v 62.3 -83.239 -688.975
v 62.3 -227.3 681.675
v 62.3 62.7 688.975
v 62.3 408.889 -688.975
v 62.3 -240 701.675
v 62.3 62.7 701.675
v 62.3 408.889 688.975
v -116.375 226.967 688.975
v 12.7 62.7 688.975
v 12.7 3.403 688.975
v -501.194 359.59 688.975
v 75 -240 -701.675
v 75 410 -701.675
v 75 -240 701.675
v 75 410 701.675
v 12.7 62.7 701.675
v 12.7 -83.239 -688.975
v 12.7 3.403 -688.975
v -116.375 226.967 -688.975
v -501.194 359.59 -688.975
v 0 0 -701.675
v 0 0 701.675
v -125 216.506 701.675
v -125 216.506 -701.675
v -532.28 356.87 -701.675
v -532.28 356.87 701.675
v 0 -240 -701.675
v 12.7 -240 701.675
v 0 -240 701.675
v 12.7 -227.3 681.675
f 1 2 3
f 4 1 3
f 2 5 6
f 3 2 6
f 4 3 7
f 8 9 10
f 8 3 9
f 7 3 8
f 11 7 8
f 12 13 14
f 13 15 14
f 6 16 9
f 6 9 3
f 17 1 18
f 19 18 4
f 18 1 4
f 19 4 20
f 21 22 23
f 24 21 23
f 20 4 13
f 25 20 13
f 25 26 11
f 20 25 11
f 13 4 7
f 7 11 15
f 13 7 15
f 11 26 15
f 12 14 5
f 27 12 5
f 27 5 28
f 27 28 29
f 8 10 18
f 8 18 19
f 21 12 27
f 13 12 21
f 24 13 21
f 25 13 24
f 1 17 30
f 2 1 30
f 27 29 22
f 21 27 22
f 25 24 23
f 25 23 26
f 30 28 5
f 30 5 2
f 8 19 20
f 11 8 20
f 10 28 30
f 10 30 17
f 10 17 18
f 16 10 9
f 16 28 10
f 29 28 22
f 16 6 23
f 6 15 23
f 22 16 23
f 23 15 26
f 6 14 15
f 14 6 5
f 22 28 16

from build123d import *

# Parameters (mm, degrees)
BOSS_EXTRUDE1_DEPTH = 701.675
SHELL1_T            = -12.7
SKETCH3_W           = 49.6
SKETCH3_H           = 290
CUT_EXTRUDE1_DEPTH  = 20
BOSS_EXTRUDE2_REACH = 980.494
CHAMFER1_SIZE       = 12.7
CHAMFER1_SIZE_2     = 20


with BuildPart() as part:
    # Sketch2 → Boss-Extrude1 (new, symmetric)
    with BuildSketch(Plane.XY):
        Polygon((0, 0), (-125, 216.506350946), (-532.280287957, 356.869859221), (75, 410), (75, -240), (0, -240), align=None)
    extrude(amount=BOSS_EXTRUDE1_DEPTH, both=True)

    # Shell1
    shell1_openings = [part.faces().sort_by_distance(p)[0] for p in [
        (-228.640143978, 383.434929611, 0),
    ]]
    offset(amount=SHELL1_T, openings=shell1_openings, kind=Kind.INTERSECTION)

    # Sketch3 → Cut-Extrude1 (cut)
    with BuildSketch(Plane.XY.offset(701.675)):
        with Locations((37.5, -82.3)):
            Rectangle(SKETCH3_W, SKETCH3_H)
    extrude(amount=-CUT_EXTRUDE1_DEPTH, mode=Mode.SUBTRACT)

    # Sketch4 → Boss-Extrude2 (add, up to next)
    with BuildSketch(Plane(origin=(12.7, 0, 0), x_dir=(0, 0, -1), z_dir=(1, 0, 0)), mode=Mode.PRIVATE) as boss_extrude2_sk1:
        Polygon((688.975, -227.3), (688.975, -83.238879933), (-681.675, -227.3), align=None)
    boss_extrude2_tool1 = extrude(boss_extrude2_sk1.sketch, amount=BOSS_EXTRUDE2_REACH, mode=Mode.PRIVATE) - part.part
    add(boss_extrude2_tool1.solids().sort_by_distance((12.7, -179.279627, -232.091667))[0])

    # Chamfer1
    # the kernel refuses this chamfer: 20, 12.7 mm, written as the material it adds along each edge
    # the kernel refuses this chamfer: 20, 12.7 mm, written as the material it takes off along each edge
    with BuildSketch(Plane(origin=(12.7, -227.3, 701.675), x_dir=(0, -0.9986795899881412, 0.05137194313161755), z_dir=(1, 0, 0))) as chamfer1_2_piece_1:
        Polygon((CHAMFER1_SIZE * 0.998679589988, CHAMFER1_SIZE * 0.0513719431316), (-CHAMFER1_SIZE_2 * 0.0513719431316, CHAMFER1_SIZE_2 * 0.998679589988), (0, 0), align=None)
    extrude(amount=49.6, mode=Mode.SUBTRACT)


solid = part.part
